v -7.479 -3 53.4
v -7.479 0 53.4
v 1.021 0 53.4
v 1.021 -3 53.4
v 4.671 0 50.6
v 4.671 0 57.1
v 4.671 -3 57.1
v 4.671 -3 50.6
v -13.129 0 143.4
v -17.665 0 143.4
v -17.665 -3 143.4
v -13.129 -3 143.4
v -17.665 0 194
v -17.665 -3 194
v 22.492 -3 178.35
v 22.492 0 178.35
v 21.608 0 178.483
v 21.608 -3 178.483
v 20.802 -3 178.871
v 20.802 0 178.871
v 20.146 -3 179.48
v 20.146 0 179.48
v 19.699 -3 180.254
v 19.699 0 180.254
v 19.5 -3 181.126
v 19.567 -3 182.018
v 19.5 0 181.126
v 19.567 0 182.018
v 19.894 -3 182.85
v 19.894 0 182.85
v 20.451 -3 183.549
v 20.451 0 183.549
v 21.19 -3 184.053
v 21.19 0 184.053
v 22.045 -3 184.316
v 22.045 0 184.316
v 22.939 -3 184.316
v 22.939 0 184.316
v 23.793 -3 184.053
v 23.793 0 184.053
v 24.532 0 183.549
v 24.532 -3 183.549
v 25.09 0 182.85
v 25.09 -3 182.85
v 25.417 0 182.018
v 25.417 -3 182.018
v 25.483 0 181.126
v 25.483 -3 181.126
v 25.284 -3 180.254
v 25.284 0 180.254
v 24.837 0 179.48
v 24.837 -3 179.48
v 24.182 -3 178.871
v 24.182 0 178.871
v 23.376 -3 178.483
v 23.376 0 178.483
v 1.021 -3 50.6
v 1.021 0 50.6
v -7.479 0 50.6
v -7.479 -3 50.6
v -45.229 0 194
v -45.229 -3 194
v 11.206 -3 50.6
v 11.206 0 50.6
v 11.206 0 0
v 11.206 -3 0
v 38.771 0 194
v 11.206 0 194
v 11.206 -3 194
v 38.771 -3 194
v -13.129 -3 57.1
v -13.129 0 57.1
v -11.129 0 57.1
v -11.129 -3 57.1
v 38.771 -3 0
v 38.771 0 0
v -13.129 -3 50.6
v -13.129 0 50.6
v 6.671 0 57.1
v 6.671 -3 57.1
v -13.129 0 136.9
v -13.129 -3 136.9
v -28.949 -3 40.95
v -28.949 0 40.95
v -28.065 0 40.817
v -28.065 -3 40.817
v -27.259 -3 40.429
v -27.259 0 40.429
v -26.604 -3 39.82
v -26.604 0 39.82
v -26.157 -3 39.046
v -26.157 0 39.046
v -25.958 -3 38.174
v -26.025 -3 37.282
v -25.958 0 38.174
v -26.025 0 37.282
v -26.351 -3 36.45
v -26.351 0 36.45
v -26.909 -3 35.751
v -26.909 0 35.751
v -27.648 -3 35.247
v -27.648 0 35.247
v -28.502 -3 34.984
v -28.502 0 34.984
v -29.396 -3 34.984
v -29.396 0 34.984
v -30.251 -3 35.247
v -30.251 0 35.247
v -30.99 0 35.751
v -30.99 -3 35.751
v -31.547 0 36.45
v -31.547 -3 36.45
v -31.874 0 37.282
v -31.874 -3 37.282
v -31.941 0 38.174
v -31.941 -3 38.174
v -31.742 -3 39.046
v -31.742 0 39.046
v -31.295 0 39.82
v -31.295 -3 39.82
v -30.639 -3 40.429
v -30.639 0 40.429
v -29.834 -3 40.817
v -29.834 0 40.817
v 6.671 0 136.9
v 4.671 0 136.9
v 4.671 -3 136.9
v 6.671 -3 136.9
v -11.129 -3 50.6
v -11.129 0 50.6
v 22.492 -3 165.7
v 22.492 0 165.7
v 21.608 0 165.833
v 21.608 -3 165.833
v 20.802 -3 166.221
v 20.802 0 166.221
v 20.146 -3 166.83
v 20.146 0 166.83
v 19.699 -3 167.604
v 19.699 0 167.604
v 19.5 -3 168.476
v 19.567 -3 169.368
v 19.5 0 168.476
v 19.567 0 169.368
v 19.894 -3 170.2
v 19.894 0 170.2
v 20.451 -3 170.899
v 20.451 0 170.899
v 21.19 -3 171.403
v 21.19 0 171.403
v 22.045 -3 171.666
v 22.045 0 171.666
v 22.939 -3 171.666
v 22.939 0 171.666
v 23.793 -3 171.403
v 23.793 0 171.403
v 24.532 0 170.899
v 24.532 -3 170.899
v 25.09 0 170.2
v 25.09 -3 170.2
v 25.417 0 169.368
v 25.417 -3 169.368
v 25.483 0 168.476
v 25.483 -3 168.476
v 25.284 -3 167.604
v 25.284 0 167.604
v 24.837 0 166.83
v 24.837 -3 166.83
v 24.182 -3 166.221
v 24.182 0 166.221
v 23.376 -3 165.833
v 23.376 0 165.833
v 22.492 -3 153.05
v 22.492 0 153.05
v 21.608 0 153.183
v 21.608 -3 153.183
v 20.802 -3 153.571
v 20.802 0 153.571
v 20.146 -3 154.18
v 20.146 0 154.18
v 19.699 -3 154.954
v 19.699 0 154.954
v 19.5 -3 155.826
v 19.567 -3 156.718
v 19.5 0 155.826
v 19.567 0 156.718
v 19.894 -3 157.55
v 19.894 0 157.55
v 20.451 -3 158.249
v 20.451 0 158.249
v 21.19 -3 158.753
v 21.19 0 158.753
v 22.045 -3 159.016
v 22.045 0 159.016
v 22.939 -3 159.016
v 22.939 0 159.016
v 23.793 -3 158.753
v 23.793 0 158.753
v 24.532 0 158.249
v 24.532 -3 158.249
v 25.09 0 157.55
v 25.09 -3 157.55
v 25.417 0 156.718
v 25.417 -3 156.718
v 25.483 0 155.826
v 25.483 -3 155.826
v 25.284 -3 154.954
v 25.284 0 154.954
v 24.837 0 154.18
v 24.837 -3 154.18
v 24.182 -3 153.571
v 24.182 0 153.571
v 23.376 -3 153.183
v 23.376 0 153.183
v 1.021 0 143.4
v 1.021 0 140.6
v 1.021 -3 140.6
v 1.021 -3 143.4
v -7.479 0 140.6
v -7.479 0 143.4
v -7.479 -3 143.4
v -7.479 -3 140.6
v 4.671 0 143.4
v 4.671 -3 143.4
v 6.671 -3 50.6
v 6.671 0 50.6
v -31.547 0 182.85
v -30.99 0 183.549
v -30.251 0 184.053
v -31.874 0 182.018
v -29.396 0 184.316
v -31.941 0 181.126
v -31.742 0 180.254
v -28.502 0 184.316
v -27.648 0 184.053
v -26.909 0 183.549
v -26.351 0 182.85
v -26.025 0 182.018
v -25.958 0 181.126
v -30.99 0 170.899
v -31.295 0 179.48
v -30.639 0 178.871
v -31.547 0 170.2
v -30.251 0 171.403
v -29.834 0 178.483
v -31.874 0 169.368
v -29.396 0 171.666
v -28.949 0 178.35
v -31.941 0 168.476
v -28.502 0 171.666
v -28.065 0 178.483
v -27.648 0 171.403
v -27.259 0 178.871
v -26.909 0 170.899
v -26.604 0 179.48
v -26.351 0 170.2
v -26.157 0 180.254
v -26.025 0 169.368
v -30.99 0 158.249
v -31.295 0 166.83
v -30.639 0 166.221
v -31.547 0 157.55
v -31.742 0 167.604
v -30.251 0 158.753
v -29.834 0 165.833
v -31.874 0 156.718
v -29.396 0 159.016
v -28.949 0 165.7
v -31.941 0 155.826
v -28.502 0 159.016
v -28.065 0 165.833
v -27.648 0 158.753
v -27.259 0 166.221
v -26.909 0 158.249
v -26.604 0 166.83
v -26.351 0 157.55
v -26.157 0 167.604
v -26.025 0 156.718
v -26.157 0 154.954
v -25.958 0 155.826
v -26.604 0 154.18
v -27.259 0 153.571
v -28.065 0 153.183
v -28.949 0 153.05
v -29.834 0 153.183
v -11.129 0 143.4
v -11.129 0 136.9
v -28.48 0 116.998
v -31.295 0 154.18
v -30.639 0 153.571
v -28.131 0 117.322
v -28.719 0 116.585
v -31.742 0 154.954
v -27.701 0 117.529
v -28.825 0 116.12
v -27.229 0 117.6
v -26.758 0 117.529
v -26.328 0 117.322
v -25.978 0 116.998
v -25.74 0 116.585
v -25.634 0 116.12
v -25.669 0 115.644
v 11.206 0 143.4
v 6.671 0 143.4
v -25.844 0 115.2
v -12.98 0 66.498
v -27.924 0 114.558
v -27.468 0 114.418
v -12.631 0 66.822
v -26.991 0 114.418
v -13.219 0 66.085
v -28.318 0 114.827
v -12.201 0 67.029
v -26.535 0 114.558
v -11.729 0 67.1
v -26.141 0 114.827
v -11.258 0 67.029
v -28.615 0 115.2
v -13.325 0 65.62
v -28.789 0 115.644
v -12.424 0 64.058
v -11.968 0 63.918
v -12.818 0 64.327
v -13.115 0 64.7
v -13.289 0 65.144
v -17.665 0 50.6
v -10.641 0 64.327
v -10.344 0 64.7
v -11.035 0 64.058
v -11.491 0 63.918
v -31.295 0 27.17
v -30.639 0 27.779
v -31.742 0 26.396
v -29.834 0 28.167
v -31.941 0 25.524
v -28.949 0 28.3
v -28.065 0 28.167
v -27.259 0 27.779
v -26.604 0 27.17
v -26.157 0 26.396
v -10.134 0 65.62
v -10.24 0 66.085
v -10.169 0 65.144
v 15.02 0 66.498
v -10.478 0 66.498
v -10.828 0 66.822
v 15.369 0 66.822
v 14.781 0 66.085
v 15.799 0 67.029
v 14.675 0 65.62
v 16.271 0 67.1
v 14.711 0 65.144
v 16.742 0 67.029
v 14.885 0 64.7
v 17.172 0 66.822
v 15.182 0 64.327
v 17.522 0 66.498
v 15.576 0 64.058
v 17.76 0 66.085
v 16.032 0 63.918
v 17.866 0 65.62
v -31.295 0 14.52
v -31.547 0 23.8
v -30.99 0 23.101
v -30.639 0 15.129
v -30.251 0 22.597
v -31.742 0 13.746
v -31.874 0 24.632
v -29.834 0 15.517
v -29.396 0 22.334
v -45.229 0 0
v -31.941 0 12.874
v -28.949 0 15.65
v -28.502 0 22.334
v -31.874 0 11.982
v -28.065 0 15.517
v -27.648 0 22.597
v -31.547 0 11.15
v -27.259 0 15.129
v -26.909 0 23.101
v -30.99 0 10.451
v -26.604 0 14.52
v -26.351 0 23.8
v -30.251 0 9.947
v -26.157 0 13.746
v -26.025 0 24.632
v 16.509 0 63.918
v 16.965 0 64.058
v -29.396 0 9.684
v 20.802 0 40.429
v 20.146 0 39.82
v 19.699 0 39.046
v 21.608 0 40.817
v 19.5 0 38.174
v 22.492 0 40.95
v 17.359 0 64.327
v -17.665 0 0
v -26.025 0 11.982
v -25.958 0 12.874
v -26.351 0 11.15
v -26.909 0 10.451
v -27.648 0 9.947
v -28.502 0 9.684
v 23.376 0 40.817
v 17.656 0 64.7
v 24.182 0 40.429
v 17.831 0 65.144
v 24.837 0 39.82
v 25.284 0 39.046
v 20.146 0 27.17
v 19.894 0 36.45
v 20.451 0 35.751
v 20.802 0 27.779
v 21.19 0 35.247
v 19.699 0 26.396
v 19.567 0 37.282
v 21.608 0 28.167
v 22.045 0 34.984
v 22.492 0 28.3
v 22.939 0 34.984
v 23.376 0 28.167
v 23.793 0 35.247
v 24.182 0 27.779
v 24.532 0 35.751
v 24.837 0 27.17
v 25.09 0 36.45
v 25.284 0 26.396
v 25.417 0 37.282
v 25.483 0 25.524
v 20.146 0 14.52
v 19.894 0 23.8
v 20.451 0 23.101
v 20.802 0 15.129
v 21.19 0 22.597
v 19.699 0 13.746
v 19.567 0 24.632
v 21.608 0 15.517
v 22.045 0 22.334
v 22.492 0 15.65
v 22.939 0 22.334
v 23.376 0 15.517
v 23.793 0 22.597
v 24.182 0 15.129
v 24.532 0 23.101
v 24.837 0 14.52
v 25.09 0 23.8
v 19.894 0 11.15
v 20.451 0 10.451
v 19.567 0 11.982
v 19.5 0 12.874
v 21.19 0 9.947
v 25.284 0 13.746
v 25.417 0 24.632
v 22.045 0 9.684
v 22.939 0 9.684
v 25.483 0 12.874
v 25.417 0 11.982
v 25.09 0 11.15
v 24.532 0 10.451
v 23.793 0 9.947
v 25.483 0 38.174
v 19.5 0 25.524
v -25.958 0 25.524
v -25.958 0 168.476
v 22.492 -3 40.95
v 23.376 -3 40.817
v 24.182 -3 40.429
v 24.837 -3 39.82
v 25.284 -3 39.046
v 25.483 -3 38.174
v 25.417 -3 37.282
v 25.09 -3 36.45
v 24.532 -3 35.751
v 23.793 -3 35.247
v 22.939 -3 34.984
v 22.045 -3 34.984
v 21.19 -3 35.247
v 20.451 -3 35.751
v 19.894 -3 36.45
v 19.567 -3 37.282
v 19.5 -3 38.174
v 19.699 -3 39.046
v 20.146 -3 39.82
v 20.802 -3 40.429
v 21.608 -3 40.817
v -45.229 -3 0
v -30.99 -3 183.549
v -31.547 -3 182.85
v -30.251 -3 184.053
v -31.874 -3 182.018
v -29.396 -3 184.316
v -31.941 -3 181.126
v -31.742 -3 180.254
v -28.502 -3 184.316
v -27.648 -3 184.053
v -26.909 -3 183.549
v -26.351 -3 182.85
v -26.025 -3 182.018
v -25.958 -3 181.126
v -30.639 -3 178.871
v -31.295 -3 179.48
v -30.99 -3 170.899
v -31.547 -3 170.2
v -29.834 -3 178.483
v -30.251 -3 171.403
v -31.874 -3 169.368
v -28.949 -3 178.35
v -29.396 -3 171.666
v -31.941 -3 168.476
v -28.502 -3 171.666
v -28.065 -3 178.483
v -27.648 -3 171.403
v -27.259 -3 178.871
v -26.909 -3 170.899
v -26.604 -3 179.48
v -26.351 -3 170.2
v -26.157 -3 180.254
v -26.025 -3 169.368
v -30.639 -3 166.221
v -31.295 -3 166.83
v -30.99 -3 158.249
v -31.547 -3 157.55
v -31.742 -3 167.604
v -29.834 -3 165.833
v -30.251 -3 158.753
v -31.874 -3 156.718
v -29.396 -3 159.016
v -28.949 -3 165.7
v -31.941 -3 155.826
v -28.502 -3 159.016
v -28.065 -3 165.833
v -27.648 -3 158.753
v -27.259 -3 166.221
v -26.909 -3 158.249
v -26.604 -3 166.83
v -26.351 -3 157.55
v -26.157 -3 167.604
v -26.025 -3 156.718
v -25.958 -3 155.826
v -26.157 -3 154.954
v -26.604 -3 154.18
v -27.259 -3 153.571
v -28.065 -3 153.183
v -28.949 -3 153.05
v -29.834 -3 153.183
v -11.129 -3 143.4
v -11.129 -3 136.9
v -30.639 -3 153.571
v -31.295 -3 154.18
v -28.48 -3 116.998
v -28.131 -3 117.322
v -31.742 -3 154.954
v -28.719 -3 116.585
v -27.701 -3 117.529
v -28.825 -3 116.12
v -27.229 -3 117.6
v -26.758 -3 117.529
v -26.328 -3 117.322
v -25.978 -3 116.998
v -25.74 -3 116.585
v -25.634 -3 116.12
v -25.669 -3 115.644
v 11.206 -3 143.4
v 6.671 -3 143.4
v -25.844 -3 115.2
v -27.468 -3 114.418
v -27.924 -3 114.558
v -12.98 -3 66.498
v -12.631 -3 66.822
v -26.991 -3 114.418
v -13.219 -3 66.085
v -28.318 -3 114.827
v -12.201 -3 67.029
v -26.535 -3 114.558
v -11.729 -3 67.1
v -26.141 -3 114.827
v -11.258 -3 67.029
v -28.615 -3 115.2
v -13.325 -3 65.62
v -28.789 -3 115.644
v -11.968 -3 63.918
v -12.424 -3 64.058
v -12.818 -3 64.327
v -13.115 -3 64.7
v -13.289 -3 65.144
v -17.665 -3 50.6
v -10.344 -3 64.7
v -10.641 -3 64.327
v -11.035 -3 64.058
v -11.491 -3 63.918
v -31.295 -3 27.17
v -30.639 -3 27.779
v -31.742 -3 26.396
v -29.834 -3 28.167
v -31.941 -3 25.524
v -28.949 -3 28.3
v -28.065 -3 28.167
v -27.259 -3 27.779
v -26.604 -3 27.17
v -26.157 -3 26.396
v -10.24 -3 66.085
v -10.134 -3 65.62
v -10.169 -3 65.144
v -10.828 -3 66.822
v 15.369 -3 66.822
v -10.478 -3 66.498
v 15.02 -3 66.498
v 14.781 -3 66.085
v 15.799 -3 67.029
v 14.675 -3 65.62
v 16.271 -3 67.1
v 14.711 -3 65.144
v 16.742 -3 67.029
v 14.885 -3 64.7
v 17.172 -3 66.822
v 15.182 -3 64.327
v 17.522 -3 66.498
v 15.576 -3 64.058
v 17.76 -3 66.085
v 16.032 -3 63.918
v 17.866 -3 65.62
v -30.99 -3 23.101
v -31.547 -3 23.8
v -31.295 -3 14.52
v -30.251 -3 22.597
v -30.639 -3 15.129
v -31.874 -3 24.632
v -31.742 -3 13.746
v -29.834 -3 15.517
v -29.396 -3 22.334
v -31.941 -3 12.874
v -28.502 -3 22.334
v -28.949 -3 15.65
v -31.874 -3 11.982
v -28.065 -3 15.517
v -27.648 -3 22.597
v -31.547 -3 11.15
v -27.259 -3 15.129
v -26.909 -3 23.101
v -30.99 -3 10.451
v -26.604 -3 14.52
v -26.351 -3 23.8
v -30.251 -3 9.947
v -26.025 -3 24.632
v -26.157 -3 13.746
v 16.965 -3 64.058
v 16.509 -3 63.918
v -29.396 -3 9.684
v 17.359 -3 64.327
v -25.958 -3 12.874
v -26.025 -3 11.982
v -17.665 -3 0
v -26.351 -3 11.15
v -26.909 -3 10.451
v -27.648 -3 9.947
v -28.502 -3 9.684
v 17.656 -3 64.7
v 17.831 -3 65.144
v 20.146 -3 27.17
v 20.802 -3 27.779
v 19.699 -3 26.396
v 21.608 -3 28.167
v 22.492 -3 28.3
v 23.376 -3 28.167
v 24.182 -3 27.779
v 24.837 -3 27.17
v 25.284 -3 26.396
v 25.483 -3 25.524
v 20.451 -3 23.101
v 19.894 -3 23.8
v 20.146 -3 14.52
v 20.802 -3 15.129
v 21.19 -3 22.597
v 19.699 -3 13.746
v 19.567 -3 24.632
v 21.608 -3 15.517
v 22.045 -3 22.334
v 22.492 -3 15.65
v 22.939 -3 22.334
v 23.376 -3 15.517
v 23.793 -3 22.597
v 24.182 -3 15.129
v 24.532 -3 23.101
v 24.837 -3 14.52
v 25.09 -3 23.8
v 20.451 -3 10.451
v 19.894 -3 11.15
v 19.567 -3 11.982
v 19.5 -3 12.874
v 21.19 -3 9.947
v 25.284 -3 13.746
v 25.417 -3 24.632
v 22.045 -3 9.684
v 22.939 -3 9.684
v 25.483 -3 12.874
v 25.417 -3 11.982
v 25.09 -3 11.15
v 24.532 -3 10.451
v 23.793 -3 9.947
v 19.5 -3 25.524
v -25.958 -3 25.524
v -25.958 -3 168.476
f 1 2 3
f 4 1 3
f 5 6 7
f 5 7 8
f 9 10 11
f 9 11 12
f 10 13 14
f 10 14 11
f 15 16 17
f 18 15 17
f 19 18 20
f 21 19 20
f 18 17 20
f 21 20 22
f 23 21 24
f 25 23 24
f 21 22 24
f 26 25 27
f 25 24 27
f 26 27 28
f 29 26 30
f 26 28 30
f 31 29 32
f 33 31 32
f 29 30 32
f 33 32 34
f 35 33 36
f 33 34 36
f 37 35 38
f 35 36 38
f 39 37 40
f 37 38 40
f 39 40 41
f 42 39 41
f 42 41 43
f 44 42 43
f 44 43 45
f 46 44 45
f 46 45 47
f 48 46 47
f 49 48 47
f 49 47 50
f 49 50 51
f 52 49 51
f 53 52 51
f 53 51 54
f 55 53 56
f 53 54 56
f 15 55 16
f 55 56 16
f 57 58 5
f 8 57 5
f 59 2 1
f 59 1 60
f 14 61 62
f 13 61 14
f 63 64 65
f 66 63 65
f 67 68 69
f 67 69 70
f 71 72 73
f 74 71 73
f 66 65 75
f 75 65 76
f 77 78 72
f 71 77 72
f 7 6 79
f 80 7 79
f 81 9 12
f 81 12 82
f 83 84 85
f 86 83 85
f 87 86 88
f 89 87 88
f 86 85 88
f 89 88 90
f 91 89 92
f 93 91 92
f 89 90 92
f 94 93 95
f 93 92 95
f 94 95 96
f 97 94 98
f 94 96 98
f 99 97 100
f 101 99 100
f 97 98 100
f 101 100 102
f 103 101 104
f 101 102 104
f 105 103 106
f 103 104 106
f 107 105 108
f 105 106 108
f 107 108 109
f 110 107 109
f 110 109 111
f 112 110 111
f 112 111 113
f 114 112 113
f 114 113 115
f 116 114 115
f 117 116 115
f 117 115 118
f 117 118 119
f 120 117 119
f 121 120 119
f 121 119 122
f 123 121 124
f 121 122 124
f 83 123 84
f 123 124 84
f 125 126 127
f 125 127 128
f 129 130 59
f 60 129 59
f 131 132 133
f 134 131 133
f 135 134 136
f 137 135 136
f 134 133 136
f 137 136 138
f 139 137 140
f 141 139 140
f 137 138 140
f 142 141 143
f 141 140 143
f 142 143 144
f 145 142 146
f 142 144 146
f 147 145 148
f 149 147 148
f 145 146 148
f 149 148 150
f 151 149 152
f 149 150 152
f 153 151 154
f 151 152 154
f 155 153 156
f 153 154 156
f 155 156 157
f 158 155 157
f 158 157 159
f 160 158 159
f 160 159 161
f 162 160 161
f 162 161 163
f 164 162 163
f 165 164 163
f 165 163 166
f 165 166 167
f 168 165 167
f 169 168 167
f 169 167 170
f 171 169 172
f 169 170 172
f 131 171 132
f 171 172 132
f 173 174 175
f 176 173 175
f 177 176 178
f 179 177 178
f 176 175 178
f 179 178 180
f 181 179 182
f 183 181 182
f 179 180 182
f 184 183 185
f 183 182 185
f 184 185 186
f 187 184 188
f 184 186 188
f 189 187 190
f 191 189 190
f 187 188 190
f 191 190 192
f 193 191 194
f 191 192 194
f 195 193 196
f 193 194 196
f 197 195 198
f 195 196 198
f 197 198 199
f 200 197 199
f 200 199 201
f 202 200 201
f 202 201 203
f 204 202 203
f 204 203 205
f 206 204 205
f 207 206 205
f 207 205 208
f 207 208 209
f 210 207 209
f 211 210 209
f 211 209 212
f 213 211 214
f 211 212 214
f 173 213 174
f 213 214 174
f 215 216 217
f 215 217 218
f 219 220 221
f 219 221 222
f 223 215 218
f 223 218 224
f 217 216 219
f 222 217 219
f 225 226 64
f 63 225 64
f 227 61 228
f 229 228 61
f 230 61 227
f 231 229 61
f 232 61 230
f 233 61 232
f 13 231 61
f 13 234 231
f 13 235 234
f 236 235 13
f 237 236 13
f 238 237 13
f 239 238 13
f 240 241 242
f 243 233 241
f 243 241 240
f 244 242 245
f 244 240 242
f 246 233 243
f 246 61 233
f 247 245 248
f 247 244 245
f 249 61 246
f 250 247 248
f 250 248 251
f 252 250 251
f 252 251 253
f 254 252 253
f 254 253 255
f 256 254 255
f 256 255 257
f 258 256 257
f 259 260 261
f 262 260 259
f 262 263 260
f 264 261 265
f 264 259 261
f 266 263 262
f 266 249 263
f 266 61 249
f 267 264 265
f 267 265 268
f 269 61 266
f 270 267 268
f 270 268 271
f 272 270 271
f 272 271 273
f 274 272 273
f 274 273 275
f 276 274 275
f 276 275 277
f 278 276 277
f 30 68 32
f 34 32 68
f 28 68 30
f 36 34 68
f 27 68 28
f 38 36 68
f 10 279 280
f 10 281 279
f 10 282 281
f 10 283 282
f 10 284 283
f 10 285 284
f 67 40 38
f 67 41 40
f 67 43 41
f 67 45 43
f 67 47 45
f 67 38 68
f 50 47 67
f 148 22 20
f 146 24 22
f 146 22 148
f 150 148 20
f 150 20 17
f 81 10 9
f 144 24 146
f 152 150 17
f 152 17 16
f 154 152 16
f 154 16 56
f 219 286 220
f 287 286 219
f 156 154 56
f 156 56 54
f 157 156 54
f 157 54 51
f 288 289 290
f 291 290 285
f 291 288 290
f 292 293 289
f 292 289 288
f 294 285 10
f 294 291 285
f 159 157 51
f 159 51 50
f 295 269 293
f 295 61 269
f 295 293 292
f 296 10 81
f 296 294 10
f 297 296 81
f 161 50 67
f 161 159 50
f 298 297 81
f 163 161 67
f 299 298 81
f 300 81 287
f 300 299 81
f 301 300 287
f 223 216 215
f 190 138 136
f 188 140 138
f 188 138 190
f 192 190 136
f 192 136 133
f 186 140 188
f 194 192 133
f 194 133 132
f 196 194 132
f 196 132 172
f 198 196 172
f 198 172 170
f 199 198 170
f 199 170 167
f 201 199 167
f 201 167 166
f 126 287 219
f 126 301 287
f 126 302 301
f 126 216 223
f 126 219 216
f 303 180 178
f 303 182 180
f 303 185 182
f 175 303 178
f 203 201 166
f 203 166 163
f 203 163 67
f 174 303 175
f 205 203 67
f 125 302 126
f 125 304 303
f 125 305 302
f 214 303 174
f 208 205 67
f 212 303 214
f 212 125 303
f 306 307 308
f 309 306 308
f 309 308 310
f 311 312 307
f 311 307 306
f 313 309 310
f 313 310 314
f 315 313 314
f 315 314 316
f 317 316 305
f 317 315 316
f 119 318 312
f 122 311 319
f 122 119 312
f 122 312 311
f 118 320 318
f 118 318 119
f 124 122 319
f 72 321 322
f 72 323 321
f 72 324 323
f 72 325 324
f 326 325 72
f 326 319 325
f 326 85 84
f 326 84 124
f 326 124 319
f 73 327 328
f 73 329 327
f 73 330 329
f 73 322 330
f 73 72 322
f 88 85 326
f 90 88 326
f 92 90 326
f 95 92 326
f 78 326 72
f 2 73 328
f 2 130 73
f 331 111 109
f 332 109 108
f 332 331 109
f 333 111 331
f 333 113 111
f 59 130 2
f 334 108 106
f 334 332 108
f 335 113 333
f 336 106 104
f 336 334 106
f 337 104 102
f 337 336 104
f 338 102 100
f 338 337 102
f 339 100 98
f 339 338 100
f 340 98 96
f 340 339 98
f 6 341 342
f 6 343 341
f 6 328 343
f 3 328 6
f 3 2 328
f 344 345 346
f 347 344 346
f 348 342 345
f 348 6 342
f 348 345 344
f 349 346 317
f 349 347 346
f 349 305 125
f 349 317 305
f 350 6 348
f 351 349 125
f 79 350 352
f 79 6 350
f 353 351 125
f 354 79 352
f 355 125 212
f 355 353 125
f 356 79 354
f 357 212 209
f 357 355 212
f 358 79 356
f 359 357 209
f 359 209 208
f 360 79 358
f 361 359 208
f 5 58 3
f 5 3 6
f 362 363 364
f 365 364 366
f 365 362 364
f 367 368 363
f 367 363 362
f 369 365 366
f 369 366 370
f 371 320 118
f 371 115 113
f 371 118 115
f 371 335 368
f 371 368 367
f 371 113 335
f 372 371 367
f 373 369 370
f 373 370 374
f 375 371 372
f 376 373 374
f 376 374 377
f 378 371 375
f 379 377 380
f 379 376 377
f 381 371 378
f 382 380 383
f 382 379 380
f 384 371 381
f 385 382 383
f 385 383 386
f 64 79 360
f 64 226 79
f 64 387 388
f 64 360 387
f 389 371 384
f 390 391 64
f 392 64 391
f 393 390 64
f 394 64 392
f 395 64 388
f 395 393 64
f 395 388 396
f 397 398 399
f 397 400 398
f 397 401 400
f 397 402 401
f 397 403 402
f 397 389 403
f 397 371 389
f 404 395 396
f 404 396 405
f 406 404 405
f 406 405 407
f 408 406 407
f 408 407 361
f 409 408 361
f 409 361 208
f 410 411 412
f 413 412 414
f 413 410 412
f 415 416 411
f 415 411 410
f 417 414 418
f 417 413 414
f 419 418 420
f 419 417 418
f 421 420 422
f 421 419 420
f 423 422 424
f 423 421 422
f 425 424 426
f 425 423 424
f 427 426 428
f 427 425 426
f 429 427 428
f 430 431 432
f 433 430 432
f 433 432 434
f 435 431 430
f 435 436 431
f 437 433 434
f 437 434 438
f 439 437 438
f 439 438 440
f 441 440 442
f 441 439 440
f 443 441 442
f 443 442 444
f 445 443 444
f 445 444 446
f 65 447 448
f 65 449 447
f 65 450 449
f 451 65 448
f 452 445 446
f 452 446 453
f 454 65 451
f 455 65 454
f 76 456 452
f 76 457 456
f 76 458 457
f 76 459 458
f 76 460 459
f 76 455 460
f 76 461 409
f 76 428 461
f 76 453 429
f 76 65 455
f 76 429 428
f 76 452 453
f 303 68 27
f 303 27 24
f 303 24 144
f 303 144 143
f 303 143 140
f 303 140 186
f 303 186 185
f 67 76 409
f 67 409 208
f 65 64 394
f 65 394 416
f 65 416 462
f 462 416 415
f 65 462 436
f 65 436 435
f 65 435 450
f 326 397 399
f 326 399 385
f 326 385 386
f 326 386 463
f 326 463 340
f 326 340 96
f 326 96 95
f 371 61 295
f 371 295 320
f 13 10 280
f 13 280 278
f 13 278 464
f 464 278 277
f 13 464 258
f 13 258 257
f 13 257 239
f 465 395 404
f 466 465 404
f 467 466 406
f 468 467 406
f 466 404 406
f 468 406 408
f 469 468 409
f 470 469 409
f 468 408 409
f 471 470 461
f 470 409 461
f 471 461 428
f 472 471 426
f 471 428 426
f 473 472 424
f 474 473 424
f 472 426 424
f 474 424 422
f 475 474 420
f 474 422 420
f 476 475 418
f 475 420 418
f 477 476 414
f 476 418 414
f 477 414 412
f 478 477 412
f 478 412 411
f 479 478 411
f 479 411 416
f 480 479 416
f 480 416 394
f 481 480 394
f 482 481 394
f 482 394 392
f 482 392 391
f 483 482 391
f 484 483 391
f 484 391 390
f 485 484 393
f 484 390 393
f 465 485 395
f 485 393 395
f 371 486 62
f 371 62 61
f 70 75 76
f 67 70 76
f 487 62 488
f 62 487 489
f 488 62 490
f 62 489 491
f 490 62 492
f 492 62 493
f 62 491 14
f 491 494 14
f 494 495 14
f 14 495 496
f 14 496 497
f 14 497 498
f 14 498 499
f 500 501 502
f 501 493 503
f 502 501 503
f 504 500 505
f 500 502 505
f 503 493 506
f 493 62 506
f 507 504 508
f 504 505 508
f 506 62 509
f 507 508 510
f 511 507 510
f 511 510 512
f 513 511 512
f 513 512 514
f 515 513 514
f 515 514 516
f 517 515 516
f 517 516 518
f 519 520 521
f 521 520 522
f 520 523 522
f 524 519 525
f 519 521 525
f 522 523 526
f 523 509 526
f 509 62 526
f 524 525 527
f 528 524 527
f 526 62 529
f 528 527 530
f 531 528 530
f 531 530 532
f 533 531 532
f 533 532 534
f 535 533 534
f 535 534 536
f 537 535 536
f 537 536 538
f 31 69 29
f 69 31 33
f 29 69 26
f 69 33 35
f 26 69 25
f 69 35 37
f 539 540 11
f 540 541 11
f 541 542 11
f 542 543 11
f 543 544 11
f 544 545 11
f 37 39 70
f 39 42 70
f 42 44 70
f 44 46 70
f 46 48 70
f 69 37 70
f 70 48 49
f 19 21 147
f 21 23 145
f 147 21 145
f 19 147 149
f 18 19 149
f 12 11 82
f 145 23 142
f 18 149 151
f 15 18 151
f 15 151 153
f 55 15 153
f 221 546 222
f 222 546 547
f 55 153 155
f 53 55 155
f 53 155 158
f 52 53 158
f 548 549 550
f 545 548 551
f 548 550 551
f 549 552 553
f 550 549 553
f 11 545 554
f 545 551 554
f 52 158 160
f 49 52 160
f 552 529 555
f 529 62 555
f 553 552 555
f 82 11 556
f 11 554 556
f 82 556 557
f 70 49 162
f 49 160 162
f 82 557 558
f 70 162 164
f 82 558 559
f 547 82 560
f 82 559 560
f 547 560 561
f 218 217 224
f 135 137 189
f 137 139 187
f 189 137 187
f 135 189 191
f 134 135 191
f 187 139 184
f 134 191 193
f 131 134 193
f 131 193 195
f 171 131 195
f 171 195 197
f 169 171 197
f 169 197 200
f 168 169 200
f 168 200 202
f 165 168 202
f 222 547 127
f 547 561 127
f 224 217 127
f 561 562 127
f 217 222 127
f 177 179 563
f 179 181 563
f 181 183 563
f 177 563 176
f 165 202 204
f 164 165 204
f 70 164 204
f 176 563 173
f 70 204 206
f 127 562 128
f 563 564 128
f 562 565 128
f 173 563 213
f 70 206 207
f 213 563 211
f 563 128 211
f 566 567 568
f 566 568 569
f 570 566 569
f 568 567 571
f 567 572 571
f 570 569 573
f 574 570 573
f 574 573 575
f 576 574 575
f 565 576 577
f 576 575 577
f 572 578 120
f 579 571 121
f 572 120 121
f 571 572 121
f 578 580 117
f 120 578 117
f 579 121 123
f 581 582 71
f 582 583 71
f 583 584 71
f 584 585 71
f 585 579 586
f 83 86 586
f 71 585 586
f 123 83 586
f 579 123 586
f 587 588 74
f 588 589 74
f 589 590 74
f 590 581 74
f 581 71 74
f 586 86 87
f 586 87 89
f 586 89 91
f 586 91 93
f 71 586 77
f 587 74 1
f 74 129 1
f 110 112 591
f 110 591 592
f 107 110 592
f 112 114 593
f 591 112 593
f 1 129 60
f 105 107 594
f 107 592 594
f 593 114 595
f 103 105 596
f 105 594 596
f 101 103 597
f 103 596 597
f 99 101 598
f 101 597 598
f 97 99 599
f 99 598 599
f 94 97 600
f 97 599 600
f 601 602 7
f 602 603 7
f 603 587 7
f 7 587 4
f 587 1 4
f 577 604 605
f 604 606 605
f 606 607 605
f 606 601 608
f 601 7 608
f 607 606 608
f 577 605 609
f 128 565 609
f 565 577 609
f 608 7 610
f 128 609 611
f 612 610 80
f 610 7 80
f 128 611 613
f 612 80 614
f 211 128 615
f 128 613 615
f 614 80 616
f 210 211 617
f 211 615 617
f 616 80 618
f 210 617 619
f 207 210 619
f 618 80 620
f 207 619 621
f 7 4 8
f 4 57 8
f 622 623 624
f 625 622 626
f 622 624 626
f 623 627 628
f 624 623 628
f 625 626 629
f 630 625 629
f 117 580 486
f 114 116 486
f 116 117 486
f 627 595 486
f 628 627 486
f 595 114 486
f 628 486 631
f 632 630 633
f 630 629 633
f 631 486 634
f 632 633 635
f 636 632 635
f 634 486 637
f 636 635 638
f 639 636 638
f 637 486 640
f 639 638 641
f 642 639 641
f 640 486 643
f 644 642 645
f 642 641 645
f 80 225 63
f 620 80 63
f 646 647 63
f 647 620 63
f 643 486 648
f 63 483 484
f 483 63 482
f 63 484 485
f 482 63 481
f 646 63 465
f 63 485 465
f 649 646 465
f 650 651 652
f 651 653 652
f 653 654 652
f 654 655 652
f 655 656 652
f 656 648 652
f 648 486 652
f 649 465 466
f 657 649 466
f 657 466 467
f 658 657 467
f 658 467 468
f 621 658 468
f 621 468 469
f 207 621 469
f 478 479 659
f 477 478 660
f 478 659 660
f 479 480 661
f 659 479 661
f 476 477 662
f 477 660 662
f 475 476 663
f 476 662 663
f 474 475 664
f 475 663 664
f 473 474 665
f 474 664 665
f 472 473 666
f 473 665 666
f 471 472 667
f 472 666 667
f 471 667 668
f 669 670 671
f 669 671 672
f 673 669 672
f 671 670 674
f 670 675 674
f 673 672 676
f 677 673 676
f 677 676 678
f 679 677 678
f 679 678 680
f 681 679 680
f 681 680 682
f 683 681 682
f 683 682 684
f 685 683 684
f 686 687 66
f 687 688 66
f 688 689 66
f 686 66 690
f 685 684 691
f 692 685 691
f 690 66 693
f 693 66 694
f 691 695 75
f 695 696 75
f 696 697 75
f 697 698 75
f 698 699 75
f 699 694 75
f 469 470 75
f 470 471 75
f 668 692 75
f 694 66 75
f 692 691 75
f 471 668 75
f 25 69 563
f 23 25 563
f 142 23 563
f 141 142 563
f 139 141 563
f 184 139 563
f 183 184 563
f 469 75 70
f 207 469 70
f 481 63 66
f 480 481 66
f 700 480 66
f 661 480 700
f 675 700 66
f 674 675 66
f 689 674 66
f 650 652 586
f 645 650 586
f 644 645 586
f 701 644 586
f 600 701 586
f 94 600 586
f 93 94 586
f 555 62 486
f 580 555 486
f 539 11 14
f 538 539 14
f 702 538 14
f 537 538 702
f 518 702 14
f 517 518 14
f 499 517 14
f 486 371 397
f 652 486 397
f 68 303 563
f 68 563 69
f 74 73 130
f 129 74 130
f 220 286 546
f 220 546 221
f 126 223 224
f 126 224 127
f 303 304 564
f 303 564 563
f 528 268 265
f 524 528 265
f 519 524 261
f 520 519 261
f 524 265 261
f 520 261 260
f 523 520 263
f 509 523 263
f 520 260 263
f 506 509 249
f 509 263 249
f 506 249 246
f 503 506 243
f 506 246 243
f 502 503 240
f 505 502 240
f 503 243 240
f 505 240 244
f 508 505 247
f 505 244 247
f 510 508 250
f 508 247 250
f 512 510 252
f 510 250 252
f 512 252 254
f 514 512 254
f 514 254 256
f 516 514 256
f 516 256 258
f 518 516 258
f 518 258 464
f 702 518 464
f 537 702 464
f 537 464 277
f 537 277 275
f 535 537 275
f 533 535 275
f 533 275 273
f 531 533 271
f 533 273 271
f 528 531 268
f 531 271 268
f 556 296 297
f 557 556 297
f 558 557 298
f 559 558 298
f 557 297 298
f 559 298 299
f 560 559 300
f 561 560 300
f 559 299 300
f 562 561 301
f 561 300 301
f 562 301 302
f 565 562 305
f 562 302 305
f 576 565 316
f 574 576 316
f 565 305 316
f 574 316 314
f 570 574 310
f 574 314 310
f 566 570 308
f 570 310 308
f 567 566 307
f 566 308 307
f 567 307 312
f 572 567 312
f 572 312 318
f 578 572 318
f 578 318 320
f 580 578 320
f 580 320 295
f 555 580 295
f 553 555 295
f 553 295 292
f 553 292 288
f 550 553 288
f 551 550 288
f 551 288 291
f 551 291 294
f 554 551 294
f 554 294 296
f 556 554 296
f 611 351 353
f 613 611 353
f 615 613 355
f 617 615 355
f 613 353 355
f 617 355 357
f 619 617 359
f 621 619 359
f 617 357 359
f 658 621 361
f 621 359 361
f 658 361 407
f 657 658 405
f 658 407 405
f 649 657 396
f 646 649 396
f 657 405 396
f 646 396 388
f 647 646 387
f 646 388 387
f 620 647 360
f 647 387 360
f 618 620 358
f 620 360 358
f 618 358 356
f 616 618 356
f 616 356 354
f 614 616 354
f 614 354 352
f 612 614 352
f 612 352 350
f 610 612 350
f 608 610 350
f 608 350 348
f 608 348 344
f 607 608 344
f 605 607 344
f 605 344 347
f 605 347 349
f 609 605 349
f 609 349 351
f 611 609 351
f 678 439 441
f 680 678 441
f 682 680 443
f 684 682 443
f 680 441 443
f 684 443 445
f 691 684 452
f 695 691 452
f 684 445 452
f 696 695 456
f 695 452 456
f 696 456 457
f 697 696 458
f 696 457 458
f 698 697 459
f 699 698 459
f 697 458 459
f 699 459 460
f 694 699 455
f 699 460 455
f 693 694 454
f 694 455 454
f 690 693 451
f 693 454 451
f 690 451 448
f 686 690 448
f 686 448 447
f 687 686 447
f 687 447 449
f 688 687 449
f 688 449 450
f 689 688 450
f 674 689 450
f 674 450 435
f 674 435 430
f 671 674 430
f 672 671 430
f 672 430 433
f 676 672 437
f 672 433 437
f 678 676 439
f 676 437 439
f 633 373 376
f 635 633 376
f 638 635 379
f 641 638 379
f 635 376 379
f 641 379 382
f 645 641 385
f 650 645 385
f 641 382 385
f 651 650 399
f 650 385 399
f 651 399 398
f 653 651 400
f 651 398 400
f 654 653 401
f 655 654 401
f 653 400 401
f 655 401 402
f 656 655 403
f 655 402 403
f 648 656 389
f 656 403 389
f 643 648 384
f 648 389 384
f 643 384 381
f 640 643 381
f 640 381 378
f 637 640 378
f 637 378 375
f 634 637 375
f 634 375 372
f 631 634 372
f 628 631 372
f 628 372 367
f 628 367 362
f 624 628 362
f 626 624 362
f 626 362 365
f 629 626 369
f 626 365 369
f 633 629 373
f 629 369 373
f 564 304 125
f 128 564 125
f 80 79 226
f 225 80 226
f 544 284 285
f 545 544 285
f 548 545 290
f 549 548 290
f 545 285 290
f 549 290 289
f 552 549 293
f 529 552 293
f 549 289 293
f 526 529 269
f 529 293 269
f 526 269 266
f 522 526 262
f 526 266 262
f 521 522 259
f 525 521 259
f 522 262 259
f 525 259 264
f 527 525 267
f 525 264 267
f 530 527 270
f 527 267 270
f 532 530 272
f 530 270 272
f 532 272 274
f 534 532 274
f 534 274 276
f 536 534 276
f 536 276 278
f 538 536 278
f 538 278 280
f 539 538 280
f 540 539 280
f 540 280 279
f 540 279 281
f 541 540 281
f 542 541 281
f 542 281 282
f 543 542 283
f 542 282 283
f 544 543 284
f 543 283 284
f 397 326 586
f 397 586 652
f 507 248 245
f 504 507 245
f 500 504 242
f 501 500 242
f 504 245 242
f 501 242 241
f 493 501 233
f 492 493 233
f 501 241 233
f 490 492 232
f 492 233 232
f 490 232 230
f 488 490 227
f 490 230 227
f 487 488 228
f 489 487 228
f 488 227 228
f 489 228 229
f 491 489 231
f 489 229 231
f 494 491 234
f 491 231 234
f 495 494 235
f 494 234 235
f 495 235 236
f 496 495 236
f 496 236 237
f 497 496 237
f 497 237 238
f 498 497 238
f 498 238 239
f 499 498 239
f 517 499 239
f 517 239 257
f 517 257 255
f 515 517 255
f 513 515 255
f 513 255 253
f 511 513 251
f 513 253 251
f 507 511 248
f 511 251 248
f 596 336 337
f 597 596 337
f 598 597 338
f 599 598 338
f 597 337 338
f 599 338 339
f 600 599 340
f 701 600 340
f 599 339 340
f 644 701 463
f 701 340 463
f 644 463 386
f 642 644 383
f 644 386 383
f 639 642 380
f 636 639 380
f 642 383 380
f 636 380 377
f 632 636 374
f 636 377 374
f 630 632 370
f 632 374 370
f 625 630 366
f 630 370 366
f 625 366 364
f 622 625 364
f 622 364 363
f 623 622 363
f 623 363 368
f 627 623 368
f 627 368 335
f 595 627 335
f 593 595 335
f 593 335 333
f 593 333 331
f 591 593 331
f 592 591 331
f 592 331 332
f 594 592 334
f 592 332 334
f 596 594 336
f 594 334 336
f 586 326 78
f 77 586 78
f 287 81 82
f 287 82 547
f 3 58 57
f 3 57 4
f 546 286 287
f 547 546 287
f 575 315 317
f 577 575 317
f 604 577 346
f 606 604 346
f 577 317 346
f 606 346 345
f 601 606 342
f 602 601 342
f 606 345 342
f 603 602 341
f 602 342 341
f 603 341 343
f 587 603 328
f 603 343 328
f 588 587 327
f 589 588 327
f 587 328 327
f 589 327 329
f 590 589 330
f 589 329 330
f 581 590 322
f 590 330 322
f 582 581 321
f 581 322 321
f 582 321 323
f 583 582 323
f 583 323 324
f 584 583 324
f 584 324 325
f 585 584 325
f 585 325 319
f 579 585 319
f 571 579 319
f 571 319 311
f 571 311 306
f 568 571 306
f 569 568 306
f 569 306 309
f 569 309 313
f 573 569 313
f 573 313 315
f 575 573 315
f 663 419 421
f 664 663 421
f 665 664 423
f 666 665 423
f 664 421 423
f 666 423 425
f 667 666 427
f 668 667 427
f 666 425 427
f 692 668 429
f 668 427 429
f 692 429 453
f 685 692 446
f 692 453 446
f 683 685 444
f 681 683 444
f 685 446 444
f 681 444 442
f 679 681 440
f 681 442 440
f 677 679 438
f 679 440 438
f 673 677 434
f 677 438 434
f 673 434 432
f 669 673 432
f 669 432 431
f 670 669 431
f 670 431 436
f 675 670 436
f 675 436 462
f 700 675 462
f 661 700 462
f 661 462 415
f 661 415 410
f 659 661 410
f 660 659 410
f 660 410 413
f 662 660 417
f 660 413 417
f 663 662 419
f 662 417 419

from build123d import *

# Parameters (mm, degrees)
ESBO_O1_W                = 84
ESBO_O1_H                = 3
RESSALTO_EXTRUS_O1_DEPTH = 194
CORTE_EXTRUS_O1_DEPTH    = 194
CORTE_EXTRUS_O5_DEPTH    = 10
CORTE_EXTRUS_O6_DEPTH    = 10
ESBO_O9_W                = 3.064404225
ESBO_O9_H                = 50.6
RESSALTO_EXTRUS_O2_DEPTH = 3
ESBO_O12_R               = 3
CORTE_EXTRUS_O8_DEPTH    = 3
ESBO_O14_R               = 3
RESSALTO_EXTRUS_O3_DEPTH = 3
ESBO_O16_R               = 3
CORTE_EXTRUS_O9_DEPTH    = 3
ESBO_O17_W               = 1
ESBO_O17_H               = 6.5
CORTE_EXTRUS_O10_DEPTH   = 10
ESBO_O18_W               = 2
ESBO_O18_H               = 6.5
CORTE_EXTRUS_O11_DEPTH   = 10
ESBO_O19_R               = 1.6
CORTE_EXTRUS_O12_DEPTH   = 10
CORTE_EXTRUS_O13_DEPTH   = 10
CORTE_EXTRUS_O14_DEPTH   = 10


with BuildPart() as part:
    # Esboço1 → Ressalto-extrusão1 (new body)
    with BuildSketch(Plane.XY):
        with Locations((-3.22930454, -1.5)):
            Rectangle(ESBO_O1_W, ESBO_O1_H)
    extrude(amount=RESSALTO_EXTRUS_O1_DEPTH)

    # Esboço2 → Corte-extrusão1 (cut)
    with BuildSketch(Plane(origin=(0, 0, 0), x_dir=(1, 0, 0), z_dir=(0, 1, 0))):
        Polygon((-3.22930454, 0), (9.27069546, 0), (9.27069546, -50.6), (-15.72930454, -50.6), (-15.72930454, 0), align=None)
        Polygon((-3.22930454, -194), (9.27069546, -194), (9.27069546, -143.4), (-15.72930454, -143.4), (-15.72930454, -194), align=None)
    extrude(amount=-CORTE_EXTRUS_O1_DEPTH, mode=Mode.SUBTRACT)

    # Esboço7 → Corte-extrusão5 (cut)
    with BuildSketch(Plane(origin=(0, 0, 0), x_dir=(1, 0, 0), z_dir=(0, 1, 0))):
        Polygon((-20.72930454, -50.6), (-3.22930454, -50.6), (14.27069546, -50.6), (14.27069546, 0), (-20.72930454, 0), align=None)
    extrude(amount=-CORTE_EXTRUS_O5_DEPTH, mode=Mode.SUBTRACT)

    # Esboço8 → Corte-extrusão6 (cut)
    with BuildSketch(Plane(origin=(0, 0, 0), x_dir=(1, 0, 0), z_dir=(0, 1, 0))):
        Polygon((14.27069546, -143.4), (-3.22930454, -143.4), (-20.72930454, -143.4), (-20.72930454, -194), (14.27069546, -194), align=None)
    extrude(amount=-CORTE_EXTRUS_O6_DEPTH, mode=Mode.SUBTRACT)

    # Esboço9 → Ressalto-extrusão2 (add)
    with BuildSketch(Plane(origin=(0, 0, 0), x_dir=(1, 0, 0), z_dir=(0, 1, 0))):
        with Locations((-19.197102427, -25.3)):
            Rectangle(ESBO_O9_W, ESBO_O9_H)
        with Locations((12.738493348, -25.3)):
            Rectangle(ESBO_O9_W, ESBO_O9_H)
    extrude(amount=-RESSALTO_EXTRUS_O2_DEPTH)

    # Esboço12 → Corte-extrusão8 (cut)
    with BuildSketch(Plane(origin=(0, 0, 0), x_dir=(1, 0, 0), z_dir=(0, 1, 0))):
        with Locations(Location((22.49182576, -37.95, 0), (0, 0, 270))):
            Circle(ESBO_O12_R)
        with Locations(Location((22.49182576, -25.3, 0), (0, 0, 270))):
            Circle(ESBO_O12_R)
        with Locations(Location((22.49182576, -12.65, 0), (0, 0, 270))):
            Circle(ESBO_O12_R)
        with Locations(Location((-28.94930454, -12.65, 0), (0, 0, 270))):
            Circle(ESBO_O12_R)
        with Locations(Location((-28.94930454, -25.3, 0), (0, 0, 270))):
            Circle(ESBO_O12_R)
        with Locations(Location((-28.94930454, -37.95, 0), (0, 0, 270))):
            Circle(ESBO_O12_R)
    extrude(amount=-CORTE_EXTRUS_O8_DEPTH, mode=Mode.SUBTRACT)

    # Esboço14 → Ressalto-extrusão3 (add)
    with BuildSketch(Plane(origin=(0, 0, 0), x_dir=(1, 0, 0), z_dir=(0, 1, 0))):
        Polygon((38.77069546, -194), (38.77069546, -97), (-45.22930454, -97), (-45.22930454, -194), (-17.664900315, -194), (-17.664900315, -143.4), (11.206291235, -143.4), (11.206291235, -194), align=None)
        with Locations((-28.94930454, -181.35)):
            Circle(ESBO_O14_R, mode=Mode.SUBTRACT)
        with Locations((-28.94930454, -168.7)):
            Circle(ESBO_O14_R, mode=Mode.SUBTRACT)
        with Locations((-28.94930454, -156.05)):
            Circle(ESBO_O14_R, mode=Mode.SUBTRACT)
        with Locations((22.49182576, -181.35)):
            Circle(ESBO_O14_R, mode=Mode.SUBTRACT)
        with Locations((22.49182576, -168.7)):
            Circle(ESBO_O14_R, mode=Mode.SUBTRACT)
        with Locations((22.49182576, -156.05)):
            Circle(ESBO_O14_R, mode=Mode.SUBTRACT)
    extrude(amount=-RESSALTO_EXTRUS_O3_DEPTH)

    # Esboço16 → Corte-extrusão9 (cut)
    with BuildSketch(Plane(origin=(0, 0, 0), x_dir=(1, 0, 0), z_dir=(0, 1, 0))):
        with Locations(Location((22.49182576, -37.95, 0), (0, 0, 270))):
            Circle(ESBO_O16_R)
        with Locations(Location((22.49182576, -25.3, 0), (0, 0, 270))):
            Circle(ESBO_O16_R)
        with Locations(Location((22.49182576, -12.65, 0), (0, 0, 270))):
            Circle(ESBO_O16_R)
        with Locations(Location((-28.94930454, -12.65, 0), (0, 0, 270))):
            Circle(ESBO_O16_R)
        with Locations(Location((-28.94930454, -25.3, 0), (0, 0, 270))):
            Circle(ESBO_O16_R)
        with Locations(Location((-28.94930454, -37.95, 0), (0, 0, 270))):
            Circle(ESBO_O16_R)
        with Locations(Location((-28.94930454, -156.05, 0), (0, 0, 90))):
            Circle(ESBO_O16_R)
        with Locations(Location((-28.94930454, -168.7, 0), (0, 0, 90))):
            Circle(ESBO_O16_R)
        with Locations(Location((-28.94930454, -181.35, 0), (0, 0, 90))):
            Circle(ESBO_O16_R)
        with Locations(Location((22.49182576, -181.35, 0), (0, 0, 90))):
            Circle(ESBO_O16_R)
        with Locations(Location((22.49182576, -168.7, 0), (0, 0, 90))):
            Circle(ESBO_O16_R)
        with Locations(Location((22.49182576, -156.05, 0), (0, 0, 90))):
            Circle(ESBO_O16_R)
    extrude(amount=-CORTE_EXTRUS_O9_DEPTH, mode=Mode.SUBTRACT)

    # Esboço17 → Corte-extrusão10 (cut)
    with BuildSketch(Plane(origin=(0, 0, 0), x_dir=(1, 0, 0), z_dir=(0, 1, 0))):
        with Locations((6.17069546, -53.85)):
            Rectangle(ESBO_O17_W, ESBO_O17_H)
        with Locations((5.17069546, -53.85)):
            Rectangle(ESBO_O17_W, ESBO_O17_H)
        Polygon((-11.12930454, -57.1), (-11.12930454, -50.6), (-12.12930454, -50.6), (-13.12930454, -50.6), (-13.12930454, -57.1), align=None)
    extrude(amount=-CORTE_EXTRUS_O10_DEPTH, mode=Mode.SUBTRACT)

    # Esboço18 → Corte-extrusão11 (cut)
    with BuildSketch(Plane(origin=(0, 0, 0), x_dir=(1, 0, 0), z_dir=(0, 1, 0))):
        with Locations((5.67069546, -140.15)):
            Rectangle(ESBO_O18_W, ESBO_O18_H)
        with Locations((-12.12930454, -140.15)):
            Rectangle(ESBO_O18_W, ESBO_O18_H)
    extrude(amount=-CORTE_EXTRUS_O11_DEPTH, mode=Mode.SUBTRACT)

    # Esboço19 → Corte-extrusão12 (cut)
    with BuildSketch(Plane(origin=(0, 0, 0), x_dir=(1, 0, 0), z_dir=(0, 1, 0))):
        with Locations(Location((-27.22930454, -116, 0), (0, 0, 270))):
            Circle(ESBO_O19_R)
        with Locations(Location((16.27069546, -65.5, 0), (0, 0, 270))):
            Circle(ESBO_O19_R)
        with Locations(Location((-11.72930454, -65.5, 0), (0, 0, 270))):
            Circle(ESBO_O19_R)
    extrude(amount=-CORTE_EXTRUS_O12_DEPTH, mode=Mode.SUBTRACT)

    # Esboço20 → Corte-extrusão13 (cut)
    with BuildSketch(Plane(origin=(0, 0, 0), x_dir=(1, 0, 0), z_dir=(0, 1, 0))):
        Polygon((-3.22930454, -140.6), (1.02069546, -140.6), (1.02069546, -143.4), (-7.47930454, -143.4), (-7.47930454, -140.6), align=None)
    extrude(amount=-CORTE_EXTRUS_O13_DEPTH, mode=Mode.SUBTRACT)

    # Esboço21 → Corte-extrusão14 (cut)
    with BuildSketch(Plane(origin=(0, 0, 0), x_dir=(1, 0, 0), z_dir=(0, 1, 0))):
        Polygon((-3.22930454, -53.4), (-7.47930454, -53.4), (-7.47930454, -50.6), (1.02069546, -50.6), (1.02069546, -53.4), align=None)
    extrude(amount=-CORTE_EXTRUS_O14_DEPTH, mode=Mode.SUBTRACT)


solid = part.part
